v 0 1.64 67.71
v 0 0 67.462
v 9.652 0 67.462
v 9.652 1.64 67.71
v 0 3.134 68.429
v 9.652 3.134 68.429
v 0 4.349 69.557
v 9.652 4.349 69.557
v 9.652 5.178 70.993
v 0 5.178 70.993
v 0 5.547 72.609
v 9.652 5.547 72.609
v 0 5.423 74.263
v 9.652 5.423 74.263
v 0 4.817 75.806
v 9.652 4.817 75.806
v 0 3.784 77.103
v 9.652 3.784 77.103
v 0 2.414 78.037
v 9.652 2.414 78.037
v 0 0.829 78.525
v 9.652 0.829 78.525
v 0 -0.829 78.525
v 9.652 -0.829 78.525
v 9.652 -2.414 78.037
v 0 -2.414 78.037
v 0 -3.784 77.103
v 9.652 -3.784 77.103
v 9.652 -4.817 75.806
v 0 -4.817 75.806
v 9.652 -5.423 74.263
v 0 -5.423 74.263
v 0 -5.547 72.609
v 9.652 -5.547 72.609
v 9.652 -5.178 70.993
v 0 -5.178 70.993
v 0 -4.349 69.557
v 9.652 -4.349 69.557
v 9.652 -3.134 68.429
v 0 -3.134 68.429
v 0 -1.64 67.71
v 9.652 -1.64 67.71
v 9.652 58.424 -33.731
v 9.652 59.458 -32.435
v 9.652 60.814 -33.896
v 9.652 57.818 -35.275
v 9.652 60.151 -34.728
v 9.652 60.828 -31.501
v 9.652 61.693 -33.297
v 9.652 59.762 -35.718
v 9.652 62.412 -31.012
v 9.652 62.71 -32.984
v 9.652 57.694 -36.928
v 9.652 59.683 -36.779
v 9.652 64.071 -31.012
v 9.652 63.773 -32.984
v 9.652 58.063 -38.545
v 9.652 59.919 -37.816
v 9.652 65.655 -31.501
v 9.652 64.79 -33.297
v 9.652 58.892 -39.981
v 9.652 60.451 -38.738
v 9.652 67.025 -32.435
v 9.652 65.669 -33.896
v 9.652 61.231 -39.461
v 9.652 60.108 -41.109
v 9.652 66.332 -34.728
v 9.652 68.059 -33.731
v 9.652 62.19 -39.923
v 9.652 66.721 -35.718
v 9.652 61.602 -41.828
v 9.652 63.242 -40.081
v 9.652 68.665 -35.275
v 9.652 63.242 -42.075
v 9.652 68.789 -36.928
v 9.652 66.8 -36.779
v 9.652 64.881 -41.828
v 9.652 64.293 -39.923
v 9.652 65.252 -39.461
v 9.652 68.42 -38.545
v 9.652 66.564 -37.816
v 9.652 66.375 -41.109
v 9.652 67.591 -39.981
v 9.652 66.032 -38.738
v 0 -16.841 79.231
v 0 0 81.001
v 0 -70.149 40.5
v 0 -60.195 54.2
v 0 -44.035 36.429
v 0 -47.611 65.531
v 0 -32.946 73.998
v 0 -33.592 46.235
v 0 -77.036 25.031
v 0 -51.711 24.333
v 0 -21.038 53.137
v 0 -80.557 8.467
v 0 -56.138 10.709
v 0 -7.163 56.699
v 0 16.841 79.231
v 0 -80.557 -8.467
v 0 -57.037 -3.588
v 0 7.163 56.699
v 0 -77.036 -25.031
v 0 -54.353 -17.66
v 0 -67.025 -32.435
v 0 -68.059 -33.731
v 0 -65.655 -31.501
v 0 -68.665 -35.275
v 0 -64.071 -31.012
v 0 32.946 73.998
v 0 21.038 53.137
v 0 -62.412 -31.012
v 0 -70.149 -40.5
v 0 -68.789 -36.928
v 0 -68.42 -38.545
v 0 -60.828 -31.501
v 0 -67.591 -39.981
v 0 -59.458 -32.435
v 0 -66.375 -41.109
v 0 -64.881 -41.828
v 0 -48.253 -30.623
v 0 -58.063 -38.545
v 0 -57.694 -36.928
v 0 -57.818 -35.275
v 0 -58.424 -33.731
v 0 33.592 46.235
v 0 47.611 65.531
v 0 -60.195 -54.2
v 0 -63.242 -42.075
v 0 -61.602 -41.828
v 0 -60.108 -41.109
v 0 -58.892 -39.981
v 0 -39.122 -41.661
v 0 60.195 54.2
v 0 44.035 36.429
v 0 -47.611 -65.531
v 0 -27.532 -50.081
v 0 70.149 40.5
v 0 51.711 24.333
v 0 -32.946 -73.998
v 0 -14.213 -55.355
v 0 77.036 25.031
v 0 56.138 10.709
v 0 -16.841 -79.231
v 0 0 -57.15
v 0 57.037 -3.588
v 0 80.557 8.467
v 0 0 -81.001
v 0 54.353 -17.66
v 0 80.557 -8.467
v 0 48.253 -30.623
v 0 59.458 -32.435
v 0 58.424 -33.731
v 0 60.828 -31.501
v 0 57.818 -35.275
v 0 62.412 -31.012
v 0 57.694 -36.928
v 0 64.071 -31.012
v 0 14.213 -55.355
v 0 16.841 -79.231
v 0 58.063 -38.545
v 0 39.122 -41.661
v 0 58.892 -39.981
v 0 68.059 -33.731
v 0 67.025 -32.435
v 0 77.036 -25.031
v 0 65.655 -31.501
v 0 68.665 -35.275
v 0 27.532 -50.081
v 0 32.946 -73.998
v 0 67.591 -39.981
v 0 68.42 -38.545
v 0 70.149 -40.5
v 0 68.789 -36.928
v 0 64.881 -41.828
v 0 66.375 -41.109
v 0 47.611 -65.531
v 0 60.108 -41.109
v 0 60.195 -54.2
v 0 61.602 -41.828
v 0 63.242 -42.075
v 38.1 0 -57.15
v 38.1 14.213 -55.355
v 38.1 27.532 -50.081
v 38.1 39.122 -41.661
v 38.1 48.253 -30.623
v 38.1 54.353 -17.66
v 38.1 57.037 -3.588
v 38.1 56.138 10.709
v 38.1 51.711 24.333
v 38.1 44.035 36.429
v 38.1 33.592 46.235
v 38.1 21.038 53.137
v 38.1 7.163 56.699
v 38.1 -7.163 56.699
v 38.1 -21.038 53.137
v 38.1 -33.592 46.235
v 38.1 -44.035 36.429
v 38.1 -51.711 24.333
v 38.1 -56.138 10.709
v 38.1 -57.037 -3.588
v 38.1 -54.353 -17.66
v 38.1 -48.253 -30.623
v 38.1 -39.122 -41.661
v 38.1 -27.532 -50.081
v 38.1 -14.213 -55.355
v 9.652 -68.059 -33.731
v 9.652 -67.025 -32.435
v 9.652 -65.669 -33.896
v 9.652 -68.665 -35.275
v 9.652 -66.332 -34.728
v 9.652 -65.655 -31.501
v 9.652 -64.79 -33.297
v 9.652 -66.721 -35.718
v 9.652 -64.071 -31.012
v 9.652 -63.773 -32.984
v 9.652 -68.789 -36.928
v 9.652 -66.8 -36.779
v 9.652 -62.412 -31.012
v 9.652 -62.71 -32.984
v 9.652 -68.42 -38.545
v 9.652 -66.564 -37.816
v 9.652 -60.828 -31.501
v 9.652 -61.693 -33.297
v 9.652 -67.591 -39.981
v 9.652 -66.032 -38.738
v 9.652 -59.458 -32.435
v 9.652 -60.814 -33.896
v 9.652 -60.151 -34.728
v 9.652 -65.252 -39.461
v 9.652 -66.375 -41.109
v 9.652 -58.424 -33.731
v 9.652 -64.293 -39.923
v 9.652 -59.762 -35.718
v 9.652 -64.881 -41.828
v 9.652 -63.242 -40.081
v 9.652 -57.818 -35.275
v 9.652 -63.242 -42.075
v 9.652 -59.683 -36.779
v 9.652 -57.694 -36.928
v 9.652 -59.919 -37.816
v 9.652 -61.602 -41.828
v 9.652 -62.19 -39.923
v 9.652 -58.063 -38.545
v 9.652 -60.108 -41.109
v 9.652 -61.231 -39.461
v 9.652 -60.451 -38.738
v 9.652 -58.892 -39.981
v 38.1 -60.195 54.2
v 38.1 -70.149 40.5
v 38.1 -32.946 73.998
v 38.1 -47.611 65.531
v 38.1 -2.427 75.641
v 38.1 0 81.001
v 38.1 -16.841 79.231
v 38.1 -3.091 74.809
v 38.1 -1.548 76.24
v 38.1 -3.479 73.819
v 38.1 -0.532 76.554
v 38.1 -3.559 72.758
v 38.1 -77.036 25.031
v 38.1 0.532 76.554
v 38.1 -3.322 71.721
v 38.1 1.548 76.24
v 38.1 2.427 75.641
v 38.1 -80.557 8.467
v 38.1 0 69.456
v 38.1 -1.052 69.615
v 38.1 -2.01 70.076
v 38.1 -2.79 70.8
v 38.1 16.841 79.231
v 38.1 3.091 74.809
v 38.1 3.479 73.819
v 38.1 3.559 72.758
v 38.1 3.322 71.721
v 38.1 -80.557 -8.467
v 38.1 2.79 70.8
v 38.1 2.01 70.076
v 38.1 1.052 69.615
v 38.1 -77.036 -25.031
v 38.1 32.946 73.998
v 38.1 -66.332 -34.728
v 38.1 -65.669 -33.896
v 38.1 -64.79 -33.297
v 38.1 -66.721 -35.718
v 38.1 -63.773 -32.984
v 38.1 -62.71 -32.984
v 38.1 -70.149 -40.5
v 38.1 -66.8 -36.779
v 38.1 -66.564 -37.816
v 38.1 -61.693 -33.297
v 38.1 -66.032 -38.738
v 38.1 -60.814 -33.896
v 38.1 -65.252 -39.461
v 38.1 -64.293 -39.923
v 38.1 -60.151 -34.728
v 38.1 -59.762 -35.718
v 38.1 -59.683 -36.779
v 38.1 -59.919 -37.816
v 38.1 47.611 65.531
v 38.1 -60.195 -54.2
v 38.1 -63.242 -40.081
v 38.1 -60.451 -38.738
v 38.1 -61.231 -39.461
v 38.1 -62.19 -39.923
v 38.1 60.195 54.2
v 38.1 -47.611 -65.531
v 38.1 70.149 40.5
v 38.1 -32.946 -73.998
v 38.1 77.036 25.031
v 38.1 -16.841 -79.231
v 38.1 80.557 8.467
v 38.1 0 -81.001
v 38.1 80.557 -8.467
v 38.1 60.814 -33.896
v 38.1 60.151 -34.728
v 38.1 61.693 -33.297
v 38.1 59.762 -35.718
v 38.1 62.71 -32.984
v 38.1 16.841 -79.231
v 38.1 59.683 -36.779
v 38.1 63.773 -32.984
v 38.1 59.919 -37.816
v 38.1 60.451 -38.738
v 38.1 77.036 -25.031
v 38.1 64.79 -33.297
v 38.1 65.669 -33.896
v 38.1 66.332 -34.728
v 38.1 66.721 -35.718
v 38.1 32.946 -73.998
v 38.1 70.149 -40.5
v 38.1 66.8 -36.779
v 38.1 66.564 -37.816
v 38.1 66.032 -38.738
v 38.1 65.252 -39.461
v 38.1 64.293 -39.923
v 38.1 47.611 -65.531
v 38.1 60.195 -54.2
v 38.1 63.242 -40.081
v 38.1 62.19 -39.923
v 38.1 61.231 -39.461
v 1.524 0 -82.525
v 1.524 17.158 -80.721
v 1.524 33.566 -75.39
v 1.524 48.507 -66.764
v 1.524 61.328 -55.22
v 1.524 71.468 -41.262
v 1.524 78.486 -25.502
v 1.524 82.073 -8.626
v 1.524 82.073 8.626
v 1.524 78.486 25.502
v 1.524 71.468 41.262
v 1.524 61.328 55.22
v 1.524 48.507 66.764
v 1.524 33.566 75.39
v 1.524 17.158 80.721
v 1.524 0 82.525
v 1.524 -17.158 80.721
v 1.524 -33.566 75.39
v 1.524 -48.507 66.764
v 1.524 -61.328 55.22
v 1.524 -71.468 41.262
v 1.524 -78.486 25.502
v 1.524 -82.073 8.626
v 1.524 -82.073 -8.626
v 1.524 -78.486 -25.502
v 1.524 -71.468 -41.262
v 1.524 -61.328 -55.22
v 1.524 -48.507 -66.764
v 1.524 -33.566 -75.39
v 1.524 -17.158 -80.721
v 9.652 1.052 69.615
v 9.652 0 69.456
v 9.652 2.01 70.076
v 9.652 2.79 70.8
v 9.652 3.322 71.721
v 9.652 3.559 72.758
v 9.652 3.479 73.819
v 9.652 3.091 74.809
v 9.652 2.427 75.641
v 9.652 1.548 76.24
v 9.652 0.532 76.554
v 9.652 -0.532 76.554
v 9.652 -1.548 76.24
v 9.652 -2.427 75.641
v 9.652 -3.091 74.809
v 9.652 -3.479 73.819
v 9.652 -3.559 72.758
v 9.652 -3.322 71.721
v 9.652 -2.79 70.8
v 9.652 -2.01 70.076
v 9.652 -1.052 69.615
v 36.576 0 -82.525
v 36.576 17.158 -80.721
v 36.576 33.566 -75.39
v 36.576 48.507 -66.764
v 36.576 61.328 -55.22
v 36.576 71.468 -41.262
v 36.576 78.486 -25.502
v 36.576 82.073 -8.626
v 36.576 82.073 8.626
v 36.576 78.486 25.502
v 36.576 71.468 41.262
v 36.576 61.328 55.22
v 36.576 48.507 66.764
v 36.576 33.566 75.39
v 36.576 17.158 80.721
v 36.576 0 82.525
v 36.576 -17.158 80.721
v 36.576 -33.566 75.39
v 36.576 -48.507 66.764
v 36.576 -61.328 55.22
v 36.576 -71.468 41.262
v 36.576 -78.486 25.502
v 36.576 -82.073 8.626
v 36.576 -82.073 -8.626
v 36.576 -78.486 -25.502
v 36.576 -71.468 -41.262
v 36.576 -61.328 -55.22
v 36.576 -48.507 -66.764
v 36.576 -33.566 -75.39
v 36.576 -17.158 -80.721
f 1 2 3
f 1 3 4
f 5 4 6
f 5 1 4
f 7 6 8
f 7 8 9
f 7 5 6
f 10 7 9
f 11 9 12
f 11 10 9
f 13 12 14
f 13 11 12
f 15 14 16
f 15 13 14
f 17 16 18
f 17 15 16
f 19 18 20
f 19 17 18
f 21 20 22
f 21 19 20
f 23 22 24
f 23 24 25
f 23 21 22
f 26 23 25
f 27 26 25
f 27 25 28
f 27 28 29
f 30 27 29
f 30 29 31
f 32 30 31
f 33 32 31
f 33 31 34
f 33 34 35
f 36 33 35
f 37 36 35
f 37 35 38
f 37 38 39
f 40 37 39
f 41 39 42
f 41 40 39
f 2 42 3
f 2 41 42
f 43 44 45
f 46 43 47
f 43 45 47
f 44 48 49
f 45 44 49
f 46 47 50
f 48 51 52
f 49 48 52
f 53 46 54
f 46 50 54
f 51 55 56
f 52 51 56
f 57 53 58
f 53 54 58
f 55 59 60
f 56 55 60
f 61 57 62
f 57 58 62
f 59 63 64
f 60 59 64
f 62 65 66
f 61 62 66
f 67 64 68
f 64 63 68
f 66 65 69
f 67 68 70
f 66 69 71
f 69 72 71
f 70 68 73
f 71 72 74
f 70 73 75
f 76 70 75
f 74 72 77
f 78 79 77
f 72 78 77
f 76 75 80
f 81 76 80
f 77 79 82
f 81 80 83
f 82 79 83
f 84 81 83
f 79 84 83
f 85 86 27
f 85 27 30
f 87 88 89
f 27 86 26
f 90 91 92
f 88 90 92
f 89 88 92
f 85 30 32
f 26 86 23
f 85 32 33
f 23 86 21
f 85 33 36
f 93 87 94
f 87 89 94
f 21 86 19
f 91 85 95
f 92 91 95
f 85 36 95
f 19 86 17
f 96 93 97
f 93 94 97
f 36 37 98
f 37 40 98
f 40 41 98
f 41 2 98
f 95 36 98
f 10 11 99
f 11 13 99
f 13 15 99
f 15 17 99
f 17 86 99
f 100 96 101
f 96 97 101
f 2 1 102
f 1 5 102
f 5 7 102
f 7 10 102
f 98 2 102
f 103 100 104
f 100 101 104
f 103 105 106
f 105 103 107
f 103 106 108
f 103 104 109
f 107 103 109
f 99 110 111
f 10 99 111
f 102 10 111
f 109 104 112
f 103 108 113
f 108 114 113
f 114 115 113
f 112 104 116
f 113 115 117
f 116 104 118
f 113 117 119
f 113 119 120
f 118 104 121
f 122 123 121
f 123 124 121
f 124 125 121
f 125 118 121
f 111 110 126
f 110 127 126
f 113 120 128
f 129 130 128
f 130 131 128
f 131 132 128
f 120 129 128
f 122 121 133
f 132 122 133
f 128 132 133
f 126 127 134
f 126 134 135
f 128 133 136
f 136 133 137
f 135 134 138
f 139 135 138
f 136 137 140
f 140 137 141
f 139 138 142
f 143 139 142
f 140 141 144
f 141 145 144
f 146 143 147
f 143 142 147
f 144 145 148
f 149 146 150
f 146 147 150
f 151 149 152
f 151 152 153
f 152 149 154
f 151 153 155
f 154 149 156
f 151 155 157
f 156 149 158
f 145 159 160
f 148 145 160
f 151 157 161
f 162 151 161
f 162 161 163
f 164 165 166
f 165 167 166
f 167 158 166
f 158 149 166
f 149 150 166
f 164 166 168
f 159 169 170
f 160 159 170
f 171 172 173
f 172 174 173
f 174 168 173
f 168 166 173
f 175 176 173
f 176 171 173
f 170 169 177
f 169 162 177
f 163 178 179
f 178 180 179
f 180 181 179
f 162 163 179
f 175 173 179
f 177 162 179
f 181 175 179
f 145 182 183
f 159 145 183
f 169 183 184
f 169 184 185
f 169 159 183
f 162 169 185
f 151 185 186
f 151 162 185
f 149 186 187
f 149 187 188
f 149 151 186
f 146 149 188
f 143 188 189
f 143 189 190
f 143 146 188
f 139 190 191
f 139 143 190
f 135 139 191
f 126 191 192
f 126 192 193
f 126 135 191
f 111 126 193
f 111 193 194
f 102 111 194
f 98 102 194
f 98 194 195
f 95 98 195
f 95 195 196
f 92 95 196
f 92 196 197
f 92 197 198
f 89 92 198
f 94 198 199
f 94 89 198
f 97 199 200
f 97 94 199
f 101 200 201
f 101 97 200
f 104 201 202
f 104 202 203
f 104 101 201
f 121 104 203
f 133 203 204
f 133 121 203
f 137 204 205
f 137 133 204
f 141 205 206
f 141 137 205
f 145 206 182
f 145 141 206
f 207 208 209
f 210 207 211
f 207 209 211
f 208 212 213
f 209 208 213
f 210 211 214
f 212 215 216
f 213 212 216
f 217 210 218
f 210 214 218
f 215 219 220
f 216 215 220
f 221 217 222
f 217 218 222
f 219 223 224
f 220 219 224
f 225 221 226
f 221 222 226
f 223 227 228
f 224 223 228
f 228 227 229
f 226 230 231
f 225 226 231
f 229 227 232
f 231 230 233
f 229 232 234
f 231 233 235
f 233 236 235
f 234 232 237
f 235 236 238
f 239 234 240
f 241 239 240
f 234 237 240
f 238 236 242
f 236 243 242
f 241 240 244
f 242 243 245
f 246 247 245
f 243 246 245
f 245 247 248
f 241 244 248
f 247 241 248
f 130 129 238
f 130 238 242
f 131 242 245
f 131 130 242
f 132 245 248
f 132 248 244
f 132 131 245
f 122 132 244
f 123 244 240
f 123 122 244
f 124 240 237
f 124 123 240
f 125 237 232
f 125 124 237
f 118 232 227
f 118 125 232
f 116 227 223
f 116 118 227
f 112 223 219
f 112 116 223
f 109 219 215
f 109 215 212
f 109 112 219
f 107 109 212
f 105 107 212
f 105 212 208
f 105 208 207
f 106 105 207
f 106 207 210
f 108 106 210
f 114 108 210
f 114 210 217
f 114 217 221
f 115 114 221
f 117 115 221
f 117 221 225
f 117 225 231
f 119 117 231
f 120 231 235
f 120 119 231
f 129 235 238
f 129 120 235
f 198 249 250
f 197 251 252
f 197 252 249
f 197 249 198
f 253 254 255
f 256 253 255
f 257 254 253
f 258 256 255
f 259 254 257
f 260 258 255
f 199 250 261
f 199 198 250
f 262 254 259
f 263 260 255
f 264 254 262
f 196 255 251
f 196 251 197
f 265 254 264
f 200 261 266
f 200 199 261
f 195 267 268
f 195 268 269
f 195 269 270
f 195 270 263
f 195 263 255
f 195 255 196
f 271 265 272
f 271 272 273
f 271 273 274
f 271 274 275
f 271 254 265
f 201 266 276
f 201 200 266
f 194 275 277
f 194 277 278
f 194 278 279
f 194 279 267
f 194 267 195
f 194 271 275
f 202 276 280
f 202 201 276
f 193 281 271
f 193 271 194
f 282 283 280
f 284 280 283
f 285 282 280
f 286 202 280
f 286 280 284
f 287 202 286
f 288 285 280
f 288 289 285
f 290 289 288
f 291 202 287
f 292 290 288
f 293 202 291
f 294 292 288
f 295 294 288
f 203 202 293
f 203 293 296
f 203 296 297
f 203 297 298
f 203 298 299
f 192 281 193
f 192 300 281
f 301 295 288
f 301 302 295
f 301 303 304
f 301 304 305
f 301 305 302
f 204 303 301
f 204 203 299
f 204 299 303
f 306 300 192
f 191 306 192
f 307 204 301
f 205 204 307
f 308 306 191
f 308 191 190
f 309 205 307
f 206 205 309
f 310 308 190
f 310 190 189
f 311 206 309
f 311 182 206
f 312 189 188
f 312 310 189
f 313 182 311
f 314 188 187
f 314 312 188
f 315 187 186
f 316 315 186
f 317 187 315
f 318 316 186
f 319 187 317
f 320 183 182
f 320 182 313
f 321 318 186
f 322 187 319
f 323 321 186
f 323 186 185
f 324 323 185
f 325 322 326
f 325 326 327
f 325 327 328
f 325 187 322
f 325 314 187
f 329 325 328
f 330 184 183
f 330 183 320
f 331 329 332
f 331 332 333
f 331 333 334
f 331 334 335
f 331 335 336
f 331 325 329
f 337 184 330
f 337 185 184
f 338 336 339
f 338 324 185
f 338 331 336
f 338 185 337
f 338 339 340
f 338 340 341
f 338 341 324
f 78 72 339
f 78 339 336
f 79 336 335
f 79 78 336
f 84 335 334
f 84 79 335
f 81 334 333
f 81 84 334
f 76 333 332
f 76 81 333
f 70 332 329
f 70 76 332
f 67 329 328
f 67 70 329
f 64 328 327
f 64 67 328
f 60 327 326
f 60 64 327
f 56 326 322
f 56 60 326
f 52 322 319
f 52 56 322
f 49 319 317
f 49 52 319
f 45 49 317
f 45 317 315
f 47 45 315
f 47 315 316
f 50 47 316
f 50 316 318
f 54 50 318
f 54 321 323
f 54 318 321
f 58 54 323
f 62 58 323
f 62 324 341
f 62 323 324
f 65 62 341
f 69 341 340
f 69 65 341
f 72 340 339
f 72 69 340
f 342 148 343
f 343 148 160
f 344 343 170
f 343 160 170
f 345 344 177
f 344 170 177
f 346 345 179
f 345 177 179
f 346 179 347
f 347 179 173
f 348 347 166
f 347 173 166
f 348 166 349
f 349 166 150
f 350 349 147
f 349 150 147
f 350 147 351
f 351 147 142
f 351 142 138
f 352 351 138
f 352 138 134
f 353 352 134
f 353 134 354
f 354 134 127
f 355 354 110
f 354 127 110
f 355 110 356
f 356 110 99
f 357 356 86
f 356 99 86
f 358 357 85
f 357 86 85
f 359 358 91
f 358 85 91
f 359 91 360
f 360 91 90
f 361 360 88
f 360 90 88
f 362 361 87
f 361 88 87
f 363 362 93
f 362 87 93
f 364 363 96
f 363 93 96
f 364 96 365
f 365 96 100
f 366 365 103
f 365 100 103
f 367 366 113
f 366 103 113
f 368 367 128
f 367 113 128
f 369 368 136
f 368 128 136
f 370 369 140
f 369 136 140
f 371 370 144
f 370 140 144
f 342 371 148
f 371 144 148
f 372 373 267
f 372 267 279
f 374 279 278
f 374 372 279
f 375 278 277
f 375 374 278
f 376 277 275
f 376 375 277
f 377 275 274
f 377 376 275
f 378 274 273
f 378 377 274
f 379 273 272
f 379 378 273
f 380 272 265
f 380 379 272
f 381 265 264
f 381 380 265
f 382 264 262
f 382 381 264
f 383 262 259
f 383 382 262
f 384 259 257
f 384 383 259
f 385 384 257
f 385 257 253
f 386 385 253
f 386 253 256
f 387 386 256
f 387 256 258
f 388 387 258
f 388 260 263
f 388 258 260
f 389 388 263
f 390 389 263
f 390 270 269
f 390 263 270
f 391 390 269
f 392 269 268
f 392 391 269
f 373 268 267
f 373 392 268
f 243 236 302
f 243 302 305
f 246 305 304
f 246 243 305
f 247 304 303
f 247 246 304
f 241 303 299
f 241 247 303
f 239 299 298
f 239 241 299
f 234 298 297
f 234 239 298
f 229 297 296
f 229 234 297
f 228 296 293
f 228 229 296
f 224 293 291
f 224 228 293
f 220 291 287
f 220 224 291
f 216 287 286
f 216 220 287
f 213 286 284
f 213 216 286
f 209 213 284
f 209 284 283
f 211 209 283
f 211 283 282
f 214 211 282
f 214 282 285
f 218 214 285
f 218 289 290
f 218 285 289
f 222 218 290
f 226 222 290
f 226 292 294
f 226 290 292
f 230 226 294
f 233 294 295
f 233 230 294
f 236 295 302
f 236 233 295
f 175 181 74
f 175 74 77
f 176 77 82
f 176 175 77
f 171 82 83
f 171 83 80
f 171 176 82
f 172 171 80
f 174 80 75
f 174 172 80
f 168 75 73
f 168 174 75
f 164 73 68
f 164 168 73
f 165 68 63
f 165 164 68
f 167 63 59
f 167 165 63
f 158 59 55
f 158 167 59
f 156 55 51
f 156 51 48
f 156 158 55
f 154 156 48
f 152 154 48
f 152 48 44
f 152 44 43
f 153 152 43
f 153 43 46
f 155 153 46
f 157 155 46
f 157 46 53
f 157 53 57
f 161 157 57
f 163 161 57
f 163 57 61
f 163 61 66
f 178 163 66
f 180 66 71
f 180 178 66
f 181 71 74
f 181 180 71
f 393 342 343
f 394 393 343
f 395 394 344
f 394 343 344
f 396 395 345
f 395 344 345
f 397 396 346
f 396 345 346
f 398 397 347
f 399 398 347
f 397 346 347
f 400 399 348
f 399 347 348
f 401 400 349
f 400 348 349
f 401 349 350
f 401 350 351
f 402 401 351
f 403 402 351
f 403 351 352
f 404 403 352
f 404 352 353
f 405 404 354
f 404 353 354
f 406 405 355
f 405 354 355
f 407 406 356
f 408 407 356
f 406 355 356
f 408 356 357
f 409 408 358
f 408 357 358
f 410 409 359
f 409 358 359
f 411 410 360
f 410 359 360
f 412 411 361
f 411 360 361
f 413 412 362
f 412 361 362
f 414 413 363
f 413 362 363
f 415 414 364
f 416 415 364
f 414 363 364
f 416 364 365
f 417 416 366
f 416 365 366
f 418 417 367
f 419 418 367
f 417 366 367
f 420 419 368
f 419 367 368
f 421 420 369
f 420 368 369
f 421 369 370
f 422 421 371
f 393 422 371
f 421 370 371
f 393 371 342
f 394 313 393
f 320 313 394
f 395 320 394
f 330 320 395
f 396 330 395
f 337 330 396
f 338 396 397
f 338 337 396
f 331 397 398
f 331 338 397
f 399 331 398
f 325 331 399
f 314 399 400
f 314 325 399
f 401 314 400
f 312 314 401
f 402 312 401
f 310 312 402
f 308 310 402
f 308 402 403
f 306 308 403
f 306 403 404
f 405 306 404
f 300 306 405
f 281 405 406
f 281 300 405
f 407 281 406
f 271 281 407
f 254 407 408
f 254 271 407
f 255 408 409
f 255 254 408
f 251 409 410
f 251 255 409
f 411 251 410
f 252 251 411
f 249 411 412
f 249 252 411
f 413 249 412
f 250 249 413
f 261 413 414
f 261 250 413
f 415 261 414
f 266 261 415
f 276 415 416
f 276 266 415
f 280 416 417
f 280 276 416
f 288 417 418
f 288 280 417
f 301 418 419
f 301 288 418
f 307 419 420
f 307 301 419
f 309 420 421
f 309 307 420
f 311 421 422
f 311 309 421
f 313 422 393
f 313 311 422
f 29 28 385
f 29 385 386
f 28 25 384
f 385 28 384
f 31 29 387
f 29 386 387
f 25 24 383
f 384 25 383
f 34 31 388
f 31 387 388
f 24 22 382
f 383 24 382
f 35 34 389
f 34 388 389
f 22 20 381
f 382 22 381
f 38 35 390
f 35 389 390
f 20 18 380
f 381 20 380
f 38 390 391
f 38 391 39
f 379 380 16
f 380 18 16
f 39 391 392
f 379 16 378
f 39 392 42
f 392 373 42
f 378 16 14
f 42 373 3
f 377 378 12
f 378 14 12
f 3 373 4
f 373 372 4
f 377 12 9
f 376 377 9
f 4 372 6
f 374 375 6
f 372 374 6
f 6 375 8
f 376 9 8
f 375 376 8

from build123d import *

# Parameters (mm, degrees)
SKETCH1_R           = 82.5246
BOSS_EXTRUDE1_DEPTH = 38.1
SKETCH2_R           = 57.15
CUT_EXTRUDE1_DEPTH  = 38.1
SKETCH3_R           = 3.5687
CUT_EXTRUDE3_DEPTH  = 123.769007532
SKETCH4_R           = 5.5626
CUT_EXTRUDE4_DEPTH  = 9.652
CHAMFER1_SIZE       = 1.524


with BuildPart() as part:
    # Sketch1 → Boss-Extrude1 (new body)
    with BuildSketch(Plane.YZ):
        with Locations(Location((0, 0, 0), (0, 0, 270))):
            Circle(SKETCH1_R)
    extrude(amount=BOSS_EXTRUDE1_DEPTH)

    # Sketch2 → Cut-Extrude1 (cut)
    with BuildSketch(Plane.YZ):
        with Locations(Location((0, 0, 0), (0, 0, 270))):
            Circle(SKETCH2_R)
    extrude(amount=CUT_EXTRUDE1_DEPTH, mode=Mode.SUBTRACT)

    # Sketch3 → Cut-Extrude3 (cut, through all)
    with BuildSketch(Plane.YZ):
        with Locations(Location((0, 73.025, 0), (0, 0, 270))):
            Circle(SKETCH3_R)
        with Locations(Location((-63.241505111, -36.5125, 0), (0, 0, 270))):
            Circle(SKETCH3_R)
        with Locations(Location((63.241505111, -36.5125, 0), (0, 0, 270))):
            Circle(SKETCH3_R)
    extrude(amount=CUT_EXTRUDE3_DEPTH, mode=Mode.SUBTRACT)

    # Sketch4 → Cut-Extrude4 (cut)
    with BuildSketch(Plane.YZ):
        with Locations(Location((0, 73.025, 0), (0, 0, 270))):
            Circle(SKETCH4_R)
        with Locations(Location((-63.241505111, -36.5125, 0), (0, 0, 270))):
            Circle(SKETCH4_R)
        with Locations(Location((63.241505111, -36.5125, 0), (0, 0, 270))):
            Circle(SKETCH4_R)
    extrude(amount=CUT_EXTRUDE4_DEPTH, mode=Mode.SUBTRACT)

    # Chamfer1
    chamfer1_edges = [part.edges().sort_by_distance(p)[0] for p in [
        (0, 0, 82.5246),
        (38.1, 0, 82.5246),
    ]]
    chamfer(chamfer1_edges, length=CHAMFER1_SIZE)


solid = part.part
